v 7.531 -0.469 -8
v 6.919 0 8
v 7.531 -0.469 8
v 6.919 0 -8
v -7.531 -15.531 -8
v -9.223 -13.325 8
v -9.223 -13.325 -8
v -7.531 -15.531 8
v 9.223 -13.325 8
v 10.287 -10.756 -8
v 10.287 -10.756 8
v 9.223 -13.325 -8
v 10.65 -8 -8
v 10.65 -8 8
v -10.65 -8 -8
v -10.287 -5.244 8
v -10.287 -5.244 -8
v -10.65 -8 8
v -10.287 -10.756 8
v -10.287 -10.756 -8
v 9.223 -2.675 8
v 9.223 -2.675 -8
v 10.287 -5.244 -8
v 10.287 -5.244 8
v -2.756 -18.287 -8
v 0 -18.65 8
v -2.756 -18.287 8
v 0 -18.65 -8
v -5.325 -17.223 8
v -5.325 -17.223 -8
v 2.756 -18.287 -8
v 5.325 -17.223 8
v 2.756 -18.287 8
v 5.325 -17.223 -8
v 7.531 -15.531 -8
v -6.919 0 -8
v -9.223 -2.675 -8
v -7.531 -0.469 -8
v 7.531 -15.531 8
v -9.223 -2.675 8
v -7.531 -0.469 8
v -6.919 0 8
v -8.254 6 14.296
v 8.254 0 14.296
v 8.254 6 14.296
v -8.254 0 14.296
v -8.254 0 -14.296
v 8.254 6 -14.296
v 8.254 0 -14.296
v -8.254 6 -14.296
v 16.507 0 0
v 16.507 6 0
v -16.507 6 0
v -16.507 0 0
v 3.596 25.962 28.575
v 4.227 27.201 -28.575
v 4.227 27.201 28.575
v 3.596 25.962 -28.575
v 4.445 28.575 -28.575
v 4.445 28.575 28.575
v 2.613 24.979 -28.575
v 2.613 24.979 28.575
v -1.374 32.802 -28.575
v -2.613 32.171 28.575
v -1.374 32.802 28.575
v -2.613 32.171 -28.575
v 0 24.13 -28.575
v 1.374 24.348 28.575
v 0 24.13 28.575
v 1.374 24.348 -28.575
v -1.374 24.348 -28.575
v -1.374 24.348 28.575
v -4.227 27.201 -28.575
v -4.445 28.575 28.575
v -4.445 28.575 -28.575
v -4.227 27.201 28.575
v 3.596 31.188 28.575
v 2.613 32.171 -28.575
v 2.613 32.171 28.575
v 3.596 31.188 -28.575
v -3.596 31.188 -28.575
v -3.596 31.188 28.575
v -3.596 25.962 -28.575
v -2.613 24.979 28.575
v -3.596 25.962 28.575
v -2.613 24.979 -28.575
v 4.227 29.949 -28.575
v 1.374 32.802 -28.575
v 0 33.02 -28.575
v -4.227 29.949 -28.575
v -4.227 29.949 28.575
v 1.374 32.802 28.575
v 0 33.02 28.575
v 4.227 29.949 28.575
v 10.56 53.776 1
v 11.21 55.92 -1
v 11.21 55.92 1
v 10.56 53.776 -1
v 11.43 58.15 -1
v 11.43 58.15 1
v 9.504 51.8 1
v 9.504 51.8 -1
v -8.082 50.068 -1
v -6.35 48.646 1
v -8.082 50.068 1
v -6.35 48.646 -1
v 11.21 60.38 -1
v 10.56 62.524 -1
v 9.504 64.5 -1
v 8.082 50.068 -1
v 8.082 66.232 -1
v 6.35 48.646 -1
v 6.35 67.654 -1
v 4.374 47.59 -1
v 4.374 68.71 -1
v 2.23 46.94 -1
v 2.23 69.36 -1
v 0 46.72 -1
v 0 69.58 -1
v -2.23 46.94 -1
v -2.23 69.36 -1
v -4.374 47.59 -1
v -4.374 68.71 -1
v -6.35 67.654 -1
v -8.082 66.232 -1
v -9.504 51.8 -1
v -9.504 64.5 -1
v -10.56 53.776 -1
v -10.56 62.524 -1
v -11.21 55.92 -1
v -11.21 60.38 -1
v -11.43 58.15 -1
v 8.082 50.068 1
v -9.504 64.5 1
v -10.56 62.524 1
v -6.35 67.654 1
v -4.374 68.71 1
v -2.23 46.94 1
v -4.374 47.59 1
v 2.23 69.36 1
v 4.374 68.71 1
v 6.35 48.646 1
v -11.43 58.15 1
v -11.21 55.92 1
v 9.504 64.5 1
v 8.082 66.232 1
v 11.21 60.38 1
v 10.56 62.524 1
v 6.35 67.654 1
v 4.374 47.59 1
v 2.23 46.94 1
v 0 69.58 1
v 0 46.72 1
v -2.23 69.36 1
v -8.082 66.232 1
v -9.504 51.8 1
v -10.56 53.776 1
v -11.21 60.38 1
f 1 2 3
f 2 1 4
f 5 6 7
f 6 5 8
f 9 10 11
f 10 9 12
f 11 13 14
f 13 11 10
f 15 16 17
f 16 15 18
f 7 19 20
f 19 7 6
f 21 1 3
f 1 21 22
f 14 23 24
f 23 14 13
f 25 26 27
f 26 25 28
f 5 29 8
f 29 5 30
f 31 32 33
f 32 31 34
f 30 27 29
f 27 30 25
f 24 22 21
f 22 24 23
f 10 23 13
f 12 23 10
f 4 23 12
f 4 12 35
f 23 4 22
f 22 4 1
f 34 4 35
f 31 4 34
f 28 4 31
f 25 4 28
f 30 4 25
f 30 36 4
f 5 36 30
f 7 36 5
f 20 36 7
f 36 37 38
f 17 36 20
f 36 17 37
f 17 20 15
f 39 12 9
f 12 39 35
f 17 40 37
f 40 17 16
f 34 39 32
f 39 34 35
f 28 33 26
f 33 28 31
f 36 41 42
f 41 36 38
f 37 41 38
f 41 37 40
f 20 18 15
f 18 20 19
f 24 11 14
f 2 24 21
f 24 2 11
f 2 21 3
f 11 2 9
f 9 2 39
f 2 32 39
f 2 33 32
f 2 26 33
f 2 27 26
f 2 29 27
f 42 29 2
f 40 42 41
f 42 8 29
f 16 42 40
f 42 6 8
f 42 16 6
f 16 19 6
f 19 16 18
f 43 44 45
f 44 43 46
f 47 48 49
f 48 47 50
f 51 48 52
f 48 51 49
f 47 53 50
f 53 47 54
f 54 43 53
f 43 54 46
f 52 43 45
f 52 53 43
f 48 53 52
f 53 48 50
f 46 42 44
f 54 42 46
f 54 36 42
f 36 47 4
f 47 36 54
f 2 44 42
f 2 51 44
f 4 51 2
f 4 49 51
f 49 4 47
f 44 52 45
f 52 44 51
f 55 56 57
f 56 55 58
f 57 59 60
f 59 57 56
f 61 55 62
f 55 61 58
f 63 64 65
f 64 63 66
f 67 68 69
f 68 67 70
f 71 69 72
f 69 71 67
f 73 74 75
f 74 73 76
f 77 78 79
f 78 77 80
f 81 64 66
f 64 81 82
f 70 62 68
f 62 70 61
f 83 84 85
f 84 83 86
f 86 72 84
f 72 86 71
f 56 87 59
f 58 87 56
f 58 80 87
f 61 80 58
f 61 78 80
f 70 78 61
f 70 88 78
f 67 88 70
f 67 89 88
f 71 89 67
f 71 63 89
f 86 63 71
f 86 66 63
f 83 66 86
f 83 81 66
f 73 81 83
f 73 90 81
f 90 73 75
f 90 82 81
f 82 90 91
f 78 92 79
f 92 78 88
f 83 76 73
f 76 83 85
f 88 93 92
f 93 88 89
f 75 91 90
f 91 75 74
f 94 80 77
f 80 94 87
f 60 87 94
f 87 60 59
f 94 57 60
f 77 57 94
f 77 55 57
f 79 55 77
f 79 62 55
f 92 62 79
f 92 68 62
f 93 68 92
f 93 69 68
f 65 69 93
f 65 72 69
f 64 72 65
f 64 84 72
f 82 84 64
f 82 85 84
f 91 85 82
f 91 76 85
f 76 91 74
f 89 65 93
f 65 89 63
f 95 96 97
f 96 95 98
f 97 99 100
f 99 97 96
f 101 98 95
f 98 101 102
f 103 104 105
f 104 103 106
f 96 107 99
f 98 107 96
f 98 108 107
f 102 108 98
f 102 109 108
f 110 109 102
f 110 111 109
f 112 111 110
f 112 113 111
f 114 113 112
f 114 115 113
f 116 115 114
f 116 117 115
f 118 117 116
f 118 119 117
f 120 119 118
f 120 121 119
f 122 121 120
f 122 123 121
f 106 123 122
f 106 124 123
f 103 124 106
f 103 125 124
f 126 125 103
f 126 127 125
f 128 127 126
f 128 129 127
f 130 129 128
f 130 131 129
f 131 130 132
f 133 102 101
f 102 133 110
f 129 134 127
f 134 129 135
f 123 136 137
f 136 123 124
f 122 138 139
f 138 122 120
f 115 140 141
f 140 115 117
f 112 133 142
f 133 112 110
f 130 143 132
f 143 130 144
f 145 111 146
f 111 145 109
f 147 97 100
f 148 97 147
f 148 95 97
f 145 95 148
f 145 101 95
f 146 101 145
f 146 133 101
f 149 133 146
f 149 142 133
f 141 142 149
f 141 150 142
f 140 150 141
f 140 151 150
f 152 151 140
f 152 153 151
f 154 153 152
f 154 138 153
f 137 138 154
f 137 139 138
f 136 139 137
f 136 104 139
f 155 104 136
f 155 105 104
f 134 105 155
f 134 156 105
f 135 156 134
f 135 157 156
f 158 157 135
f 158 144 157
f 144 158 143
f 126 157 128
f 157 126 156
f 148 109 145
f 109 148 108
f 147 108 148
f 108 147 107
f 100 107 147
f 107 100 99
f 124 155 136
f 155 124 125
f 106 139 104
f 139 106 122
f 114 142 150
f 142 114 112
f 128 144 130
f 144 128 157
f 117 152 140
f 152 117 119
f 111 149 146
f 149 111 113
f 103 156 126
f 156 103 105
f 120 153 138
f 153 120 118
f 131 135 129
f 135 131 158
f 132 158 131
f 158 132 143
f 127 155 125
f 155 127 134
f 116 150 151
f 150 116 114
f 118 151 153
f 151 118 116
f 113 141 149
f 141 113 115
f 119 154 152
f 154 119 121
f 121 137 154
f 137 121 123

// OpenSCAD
// Auto-generated by scripts/author_from_manifest.py (Phase D.3).
// Source: data/phase_d_manifest.json (sku_intent='reliable-f156-upright-155f').
// Do not hand-edit — regenerate from the manifest.
//
// @part reliable_f156_upright_155f
// @kind sprinkler_head
// @category head.upright.k56
// @display-name "Reliable F1-56 Upright K5.6 SR 155°F"
// @mfg reliable_automatic_sprinkler
// @mfg-pn F1-56
// @listing UL FM
// @hazard-classes LH OH1
// @price-usd 12.75
// @install-minutes 8
// @crew journeyman
// @k-factor 5.6
// @orientation upright
// @response standard
// @temperature 155F
// @param size_in number default=0.5 label="Size" unit="in"
// @port inlet position=[0,0.014,0] direction=[0,1,0] style=NPT_threaded size_in=0.5 role=drop

size_in = 0.5;
k_factor = 5.6;

length_mm   = 57.15;
body_dia_mm = 25.40;
thread_od   = 21.3;
thread_len  = 16;
deflector_d = body_dia_mm * 0.9;

rotate([180,0,0]) union() {
    translate([0, thread_len/2, 0])
        cylinder(h = thread_len, d = thread_od, center = true, $fn = 24);
    translate([0, -3, 0])
        rotate([90, 0, 0])
        cylinder(h = 6, d = thread_od * 1.55, $fn = 6, center = true);
    translate([0, -length_mm/2, 0])
        cylinder(h = length_mm, d = body_dia_mm * 0.35, center = true, $fn = 20);
    translate([0, -length_mm - 1, 0])
        cylinder(h = 2, d = deflector_d, center = true, $fn = 32);
}
